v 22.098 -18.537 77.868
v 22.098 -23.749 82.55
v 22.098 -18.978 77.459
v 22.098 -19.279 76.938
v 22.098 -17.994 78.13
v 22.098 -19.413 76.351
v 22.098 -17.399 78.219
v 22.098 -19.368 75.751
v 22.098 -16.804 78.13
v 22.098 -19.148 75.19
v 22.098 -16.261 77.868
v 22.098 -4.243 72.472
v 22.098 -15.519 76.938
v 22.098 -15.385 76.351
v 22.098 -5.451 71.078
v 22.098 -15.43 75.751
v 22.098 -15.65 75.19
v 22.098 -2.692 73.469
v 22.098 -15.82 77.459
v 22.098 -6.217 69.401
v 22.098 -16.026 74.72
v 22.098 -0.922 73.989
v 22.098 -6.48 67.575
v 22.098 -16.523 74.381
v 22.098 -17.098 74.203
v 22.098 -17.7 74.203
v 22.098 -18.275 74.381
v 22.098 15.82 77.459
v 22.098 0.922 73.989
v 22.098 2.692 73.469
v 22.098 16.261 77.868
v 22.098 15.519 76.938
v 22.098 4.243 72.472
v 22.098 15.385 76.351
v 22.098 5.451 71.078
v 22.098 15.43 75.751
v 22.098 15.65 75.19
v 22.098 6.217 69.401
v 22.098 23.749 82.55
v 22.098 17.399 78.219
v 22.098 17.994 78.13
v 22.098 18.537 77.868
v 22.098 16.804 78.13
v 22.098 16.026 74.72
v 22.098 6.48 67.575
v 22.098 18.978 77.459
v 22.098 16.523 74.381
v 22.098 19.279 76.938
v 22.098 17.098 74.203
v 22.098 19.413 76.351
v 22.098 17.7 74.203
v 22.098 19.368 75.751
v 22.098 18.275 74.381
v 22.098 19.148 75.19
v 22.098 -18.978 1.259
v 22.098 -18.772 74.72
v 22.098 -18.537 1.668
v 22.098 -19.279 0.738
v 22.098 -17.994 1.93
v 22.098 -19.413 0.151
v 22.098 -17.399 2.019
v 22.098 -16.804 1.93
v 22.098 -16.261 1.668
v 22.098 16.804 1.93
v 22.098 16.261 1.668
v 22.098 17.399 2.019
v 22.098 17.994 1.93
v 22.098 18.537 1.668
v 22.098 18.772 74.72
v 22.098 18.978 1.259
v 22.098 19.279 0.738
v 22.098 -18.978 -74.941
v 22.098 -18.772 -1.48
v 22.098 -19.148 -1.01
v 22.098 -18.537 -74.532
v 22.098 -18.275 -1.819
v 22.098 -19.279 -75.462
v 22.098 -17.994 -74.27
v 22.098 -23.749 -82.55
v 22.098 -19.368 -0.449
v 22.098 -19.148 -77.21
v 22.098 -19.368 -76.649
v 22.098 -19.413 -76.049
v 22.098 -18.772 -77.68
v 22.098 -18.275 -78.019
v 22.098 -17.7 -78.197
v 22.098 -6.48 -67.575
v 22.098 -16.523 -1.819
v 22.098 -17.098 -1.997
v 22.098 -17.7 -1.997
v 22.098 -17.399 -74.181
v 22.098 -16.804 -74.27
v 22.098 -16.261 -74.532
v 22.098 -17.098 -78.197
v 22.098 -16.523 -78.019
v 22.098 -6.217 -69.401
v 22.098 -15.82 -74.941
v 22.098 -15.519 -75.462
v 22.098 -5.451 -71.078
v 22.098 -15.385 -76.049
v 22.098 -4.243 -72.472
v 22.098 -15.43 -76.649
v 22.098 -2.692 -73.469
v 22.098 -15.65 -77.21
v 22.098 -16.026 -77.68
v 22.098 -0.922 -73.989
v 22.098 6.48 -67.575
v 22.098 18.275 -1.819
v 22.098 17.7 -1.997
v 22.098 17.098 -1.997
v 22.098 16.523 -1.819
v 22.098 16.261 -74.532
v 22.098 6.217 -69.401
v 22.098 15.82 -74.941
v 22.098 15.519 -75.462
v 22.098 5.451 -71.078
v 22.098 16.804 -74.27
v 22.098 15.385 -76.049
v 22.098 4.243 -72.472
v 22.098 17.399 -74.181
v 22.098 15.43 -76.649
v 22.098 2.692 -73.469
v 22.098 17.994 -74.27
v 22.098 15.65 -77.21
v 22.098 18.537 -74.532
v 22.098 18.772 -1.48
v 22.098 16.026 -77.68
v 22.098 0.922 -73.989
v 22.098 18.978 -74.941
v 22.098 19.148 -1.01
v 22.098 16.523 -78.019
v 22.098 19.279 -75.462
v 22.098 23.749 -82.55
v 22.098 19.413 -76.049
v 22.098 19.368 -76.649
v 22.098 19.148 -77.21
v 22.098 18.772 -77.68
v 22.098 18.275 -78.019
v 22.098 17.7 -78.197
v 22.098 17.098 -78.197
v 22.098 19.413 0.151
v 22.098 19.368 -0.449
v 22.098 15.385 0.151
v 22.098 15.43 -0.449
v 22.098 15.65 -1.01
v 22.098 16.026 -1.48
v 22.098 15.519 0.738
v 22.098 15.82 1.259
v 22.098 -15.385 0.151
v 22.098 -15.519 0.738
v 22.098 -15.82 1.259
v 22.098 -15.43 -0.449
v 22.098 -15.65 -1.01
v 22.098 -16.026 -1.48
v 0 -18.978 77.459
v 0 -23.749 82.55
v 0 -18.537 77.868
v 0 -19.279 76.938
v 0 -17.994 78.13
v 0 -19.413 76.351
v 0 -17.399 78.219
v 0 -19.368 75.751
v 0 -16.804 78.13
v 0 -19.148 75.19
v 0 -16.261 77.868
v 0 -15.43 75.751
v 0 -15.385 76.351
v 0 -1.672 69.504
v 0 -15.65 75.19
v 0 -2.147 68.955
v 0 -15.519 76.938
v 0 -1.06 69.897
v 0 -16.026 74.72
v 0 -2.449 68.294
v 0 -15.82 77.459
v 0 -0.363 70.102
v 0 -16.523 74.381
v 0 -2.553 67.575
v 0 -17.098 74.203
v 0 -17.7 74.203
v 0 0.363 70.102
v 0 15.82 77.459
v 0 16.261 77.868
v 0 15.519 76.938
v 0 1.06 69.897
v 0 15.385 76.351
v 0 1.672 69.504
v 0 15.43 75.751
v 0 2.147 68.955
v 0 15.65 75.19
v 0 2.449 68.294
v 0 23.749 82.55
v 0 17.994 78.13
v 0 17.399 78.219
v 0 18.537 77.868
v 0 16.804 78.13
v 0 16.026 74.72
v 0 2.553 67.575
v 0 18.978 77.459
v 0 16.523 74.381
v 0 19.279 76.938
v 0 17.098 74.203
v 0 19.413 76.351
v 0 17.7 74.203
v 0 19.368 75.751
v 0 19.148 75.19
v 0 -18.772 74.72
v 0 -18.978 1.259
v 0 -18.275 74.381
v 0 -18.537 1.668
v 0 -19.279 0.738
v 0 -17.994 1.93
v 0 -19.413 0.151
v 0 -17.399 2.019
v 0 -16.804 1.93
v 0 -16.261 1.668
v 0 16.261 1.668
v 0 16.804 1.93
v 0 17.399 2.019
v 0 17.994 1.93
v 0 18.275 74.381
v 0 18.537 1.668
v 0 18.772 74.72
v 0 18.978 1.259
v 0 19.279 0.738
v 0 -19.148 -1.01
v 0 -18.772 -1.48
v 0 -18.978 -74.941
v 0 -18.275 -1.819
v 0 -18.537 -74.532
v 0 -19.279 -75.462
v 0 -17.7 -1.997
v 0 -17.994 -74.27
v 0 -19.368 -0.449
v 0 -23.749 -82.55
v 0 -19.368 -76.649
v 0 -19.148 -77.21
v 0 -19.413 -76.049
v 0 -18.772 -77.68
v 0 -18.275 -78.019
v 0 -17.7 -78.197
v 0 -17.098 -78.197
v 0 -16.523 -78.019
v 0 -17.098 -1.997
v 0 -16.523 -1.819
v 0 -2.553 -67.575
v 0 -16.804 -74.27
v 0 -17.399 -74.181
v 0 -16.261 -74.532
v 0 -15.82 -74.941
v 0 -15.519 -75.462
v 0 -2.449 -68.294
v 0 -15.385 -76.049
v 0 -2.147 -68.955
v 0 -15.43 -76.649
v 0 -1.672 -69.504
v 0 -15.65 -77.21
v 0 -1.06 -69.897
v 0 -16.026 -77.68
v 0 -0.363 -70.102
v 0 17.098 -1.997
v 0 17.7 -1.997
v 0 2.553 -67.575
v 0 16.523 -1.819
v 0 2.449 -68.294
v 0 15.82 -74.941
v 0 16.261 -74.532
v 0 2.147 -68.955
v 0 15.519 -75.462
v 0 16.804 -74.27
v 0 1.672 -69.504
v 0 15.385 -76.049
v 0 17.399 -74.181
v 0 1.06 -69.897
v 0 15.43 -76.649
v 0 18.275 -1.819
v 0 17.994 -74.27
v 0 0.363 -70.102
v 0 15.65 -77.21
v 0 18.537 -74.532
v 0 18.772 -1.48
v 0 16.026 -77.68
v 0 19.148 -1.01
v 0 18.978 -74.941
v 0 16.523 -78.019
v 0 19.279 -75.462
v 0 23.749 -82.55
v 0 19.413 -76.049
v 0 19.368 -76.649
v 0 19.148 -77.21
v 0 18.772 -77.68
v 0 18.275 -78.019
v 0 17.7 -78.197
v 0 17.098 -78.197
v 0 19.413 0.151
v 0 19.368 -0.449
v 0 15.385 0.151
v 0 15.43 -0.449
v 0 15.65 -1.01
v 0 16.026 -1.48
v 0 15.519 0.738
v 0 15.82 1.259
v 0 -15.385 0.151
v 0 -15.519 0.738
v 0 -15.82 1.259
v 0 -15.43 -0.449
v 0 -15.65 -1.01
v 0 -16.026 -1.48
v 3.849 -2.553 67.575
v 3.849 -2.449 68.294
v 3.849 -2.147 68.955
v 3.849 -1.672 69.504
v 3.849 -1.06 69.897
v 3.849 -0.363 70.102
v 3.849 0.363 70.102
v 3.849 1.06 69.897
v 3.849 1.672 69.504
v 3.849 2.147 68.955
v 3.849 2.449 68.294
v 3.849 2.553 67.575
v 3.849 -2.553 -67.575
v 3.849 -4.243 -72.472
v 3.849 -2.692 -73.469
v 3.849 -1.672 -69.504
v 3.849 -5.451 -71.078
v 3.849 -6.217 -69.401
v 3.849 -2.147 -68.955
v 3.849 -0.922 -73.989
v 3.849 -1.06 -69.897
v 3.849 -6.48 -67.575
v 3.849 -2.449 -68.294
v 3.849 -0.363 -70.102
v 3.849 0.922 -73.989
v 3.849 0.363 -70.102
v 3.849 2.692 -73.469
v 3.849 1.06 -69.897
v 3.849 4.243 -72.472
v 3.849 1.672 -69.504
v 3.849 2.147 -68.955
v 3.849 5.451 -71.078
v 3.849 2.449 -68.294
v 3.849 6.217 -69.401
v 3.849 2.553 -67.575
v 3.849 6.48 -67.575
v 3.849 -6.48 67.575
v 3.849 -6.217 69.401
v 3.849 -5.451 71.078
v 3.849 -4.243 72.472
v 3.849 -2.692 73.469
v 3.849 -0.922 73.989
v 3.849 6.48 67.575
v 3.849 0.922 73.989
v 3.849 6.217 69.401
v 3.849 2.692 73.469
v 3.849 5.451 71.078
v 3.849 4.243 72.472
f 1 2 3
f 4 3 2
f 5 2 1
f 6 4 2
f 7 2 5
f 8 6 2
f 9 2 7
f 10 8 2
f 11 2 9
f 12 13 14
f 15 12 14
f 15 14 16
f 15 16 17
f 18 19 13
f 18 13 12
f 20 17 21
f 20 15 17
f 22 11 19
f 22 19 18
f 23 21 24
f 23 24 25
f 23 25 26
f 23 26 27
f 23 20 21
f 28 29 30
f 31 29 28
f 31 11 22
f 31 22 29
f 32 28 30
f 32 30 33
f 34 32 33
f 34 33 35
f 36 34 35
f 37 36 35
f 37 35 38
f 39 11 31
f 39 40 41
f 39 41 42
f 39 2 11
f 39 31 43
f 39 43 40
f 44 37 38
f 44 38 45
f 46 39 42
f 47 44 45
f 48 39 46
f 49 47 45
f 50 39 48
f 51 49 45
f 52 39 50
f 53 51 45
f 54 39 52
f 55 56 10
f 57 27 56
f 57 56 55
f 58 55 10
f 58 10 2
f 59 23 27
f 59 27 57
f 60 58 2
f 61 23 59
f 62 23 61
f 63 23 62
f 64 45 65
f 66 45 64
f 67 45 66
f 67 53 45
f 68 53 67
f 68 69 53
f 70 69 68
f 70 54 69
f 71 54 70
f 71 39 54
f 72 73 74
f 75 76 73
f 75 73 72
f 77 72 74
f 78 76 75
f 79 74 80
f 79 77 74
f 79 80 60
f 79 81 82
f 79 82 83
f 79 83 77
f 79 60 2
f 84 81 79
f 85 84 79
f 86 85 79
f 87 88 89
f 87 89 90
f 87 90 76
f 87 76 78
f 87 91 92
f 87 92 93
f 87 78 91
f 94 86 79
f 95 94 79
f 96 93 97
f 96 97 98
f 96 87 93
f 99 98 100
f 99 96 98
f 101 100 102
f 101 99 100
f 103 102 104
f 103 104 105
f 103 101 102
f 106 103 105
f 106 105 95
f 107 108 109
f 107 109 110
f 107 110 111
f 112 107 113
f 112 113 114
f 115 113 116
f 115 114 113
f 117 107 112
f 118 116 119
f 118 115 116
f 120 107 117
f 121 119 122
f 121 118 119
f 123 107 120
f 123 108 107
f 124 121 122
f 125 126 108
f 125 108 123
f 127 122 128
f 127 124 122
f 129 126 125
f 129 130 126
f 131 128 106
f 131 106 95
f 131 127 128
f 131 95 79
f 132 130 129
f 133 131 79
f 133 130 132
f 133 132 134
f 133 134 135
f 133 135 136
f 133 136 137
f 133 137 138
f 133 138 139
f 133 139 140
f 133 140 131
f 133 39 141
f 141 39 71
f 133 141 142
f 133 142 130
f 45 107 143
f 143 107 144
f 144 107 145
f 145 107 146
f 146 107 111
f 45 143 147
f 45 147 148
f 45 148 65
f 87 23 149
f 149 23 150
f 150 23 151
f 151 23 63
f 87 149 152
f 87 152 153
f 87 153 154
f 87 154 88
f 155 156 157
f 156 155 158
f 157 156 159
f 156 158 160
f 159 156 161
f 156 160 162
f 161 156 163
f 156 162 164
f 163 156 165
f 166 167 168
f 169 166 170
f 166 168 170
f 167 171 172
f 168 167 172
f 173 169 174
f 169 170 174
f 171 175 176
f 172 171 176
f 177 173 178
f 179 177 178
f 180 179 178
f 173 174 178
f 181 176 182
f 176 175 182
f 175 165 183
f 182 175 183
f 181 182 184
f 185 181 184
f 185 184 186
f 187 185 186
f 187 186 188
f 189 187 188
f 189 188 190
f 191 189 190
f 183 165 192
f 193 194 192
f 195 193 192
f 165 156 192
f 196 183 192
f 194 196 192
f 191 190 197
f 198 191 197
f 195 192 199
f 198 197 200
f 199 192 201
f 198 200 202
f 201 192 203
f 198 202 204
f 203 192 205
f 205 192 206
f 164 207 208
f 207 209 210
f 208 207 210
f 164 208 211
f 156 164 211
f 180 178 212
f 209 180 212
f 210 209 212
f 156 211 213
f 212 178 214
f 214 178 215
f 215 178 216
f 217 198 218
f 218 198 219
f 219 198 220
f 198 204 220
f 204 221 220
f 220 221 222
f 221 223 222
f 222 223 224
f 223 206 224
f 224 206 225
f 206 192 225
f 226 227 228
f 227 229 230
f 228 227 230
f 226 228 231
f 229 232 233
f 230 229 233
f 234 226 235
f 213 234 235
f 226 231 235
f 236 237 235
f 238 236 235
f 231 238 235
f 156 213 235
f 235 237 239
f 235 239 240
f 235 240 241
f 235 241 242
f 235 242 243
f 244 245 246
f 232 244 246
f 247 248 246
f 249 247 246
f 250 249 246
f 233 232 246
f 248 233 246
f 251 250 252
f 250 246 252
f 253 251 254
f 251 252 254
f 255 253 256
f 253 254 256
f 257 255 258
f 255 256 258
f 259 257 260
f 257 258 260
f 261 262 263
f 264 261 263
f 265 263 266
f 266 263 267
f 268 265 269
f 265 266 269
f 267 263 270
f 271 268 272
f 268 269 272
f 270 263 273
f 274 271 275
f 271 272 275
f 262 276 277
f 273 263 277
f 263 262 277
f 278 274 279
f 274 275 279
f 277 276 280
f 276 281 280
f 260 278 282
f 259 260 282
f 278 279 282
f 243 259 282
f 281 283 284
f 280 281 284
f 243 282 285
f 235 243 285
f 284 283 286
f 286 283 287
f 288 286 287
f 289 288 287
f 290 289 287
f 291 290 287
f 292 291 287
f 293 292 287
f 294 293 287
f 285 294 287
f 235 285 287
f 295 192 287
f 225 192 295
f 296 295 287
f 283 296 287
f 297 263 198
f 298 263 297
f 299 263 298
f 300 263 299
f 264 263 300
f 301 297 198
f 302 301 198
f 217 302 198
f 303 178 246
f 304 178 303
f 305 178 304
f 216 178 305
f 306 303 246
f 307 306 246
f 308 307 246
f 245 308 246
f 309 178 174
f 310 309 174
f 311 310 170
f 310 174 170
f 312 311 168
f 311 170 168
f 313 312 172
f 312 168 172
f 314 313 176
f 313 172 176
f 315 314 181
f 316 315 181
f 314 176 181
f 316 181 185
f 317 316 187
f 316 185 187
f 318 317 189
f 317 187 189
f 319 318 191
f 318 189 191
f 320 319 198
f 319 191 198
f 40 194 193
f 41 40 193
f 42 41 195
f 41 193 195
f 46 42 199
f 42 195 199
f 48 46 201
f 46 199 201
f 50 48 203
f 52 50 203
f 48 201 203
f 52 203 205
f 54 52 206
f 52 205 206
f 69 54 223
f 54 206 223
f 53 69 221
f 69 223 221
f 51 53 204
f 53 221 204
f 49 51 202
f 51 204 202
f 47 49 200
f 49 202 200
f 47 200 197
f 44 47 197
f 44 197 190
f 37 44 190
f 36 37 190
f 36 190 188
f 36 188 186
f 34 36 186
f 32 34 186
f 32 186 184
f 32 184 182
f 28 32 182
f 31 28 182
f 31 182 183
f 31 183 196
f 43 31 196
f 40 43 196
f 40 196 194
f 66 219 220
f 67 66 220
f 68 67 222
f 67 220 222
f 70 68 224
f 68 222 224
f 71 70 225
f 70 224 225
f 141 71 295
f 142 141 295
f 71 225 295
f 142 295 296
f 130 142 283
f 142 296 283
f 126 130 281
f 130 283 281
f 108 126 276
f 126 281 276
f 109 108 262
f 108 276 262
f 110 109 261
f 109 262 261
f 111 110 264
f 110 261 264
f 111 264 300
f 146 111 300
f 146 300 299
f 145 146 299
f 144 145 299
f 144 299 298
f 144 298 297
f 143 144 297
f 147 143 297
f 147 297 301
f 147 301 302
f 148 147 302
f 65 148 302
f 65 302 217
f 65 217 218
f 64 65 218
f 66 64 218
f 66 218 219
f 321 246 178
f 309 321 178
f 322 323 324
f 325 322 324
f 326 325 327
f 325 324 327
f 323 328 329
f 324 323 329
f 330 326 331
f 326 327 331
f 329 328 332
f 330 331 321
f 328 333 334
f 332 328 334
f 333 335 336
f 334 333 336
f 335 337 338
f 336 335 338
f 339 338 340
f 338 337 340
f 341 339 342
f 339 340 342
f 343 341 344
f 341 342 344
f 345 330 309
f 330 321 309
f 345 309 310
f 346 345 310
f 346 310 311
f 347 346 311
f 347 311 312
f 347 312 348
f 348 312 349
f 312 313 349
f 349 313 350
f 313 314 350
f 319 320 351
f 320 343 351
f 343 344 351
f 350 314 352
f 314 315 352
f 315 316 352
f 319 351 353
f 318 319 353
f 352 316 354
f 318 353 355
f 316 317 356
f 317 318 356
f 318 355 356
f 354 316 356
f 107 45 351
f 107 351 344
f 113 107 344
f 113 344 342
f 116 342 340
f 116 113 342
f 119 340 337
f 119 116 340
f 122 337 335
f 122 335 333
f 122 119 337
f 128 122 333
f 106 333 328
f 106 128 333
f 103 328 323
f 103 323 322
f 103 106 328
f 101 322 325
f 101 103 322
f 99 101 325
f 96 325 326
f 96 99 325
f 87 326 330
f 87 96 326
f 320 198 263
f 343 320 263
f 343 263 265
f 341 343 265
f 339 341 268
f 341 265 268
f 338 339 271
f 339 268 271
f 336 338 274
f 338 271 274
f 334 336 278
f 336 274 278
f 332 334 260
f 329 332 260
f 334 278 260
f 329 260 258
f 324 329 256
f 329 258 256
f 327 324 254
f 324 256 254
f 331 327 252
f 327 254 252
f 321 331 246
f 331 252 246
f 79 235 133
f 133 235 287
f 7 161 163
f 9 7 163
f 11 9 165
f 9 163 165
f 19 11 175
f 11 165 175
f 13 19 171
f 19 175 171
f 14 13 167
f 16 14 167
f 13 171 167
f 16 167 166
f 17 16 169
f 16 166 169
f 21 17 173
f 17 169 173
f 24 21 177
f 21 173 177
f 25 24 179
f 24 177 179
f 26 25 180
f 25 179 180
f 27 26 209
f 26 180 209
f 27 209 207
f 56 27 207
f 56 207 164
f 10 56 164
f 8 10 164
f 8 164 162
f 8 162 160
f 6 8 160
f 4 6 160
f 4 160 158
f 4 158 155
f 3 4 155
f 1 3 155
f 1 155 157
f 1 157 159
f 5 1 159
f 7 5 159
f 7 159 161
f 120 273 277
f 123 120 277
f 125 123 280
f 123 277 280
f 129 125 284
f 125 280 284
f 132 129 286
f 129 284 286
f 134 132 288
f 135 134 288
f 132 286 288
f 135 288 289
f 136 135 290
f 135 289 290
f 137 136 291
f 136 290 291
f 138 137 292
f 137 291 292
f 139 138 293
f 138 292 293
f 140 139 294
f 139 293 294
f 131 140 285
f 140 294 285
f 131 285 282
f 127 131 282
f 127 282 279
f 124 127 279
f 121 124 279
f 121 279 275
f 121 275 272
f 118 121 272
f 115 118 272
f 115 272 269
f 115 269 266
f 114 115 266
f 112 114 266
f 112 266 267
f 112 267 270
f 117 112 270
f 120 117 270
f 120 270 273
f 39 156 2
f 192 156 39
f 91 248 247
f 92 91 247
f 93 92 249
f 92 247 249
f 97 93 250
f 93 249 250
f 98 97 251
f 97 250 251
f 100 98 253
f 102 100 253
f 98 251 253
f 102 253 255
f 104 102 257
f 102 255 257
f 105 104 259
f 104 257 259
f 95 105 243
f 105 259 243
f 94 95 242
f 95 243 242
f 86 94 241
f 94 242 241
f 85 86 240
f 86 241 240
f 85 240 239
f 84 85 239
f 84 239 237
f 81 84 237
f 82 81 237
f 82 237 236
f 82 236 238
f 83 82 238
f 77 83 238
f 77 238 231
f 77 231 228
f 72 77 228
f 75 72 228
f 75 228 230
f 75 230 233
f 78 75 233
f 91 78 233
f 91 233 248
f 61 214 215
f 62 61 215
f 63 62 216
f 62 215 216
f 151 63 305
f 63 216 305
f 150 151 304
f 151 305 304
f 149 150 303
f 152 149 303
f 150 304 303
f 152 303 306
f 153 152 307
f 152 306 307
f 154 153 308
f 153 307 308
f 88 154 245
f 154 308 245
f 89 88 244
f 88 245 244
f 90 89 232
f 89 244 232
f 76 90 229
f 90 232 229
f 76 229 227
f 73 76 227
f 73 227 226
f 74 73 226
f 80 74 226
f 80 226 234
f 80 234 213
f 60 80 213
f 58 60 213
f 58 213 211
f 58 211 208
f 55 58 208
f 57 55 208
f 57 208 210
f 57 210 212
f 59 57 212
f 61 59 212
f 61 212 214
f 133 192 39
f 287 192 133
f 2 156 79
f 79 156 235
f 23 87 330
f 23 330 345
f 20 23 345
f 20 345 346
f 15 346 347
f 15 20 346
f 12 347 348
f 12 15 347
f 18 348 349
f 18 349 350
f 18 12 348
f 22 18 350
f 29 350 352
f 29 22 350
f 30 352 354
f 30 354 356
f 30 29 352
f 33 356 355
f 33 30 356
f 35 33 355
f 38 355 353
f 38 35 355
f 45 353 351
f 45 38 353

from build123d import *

# Parameters (mm, degrees)
SKETCH1_W              = 165.1
SKETCH1_H              = 47.498
BOSS_EXTRUDE1_DEPTH    = 22.098
CUT_EXTRUDE1_DEPTH     = 18.249011
F_10_32_TAPPED_HOLE1_D = 4.0386


with BuildPart() as part:
    # Sketch1 → Boss-Extrude1 (new body)
    with BuildSketch(Plane(origin=(0, 0, 0), x_dir=(0, 0, -1), z_dir=(1, 0, 0))):
        Rectangle(SKETCH1_W, SKETCH1_H)
        with BuildLine():
            Line((-67.5752522, 2.5527), (67.5752522, 2.5527))
            ThreePointArc((67.5752522, 2.5527), (70.1279522, 0), (67.5752522, -2.5527))
            Line((67.5752522, -2.5527), (-67.5752522, -2.5527))
            ThreePointArc((-67.5752522, -2.5527), (-70.1279522, 0), (-67.5752522, 2.5527))
        make_face(mode=Mode.SUBTRACT)
    extrude(amount=BOSS_EXTRUDE1_DEPTH)

    # Sketch2 → Cut-Extrude1 (cut)
    with BuildSketch(Plane(origin=(22.098, 0, 0), x_dir=(0, 0, -1), z_dir=(1, 0, 0))):
        with BuildLine():
            Line((-67.5752522, 6.4797559), (67.5752522, 6.4797559))
            ThreePointArc((67.5752522, 6.4797559), (74.0550081, 0), (67.5752522, -6.4797559))
            Line((67.5752522, -6.4797559), (-67.5752522, -6.4797559))
            ThreePointArc((-67.5752522, -6.4797559), (-74.0550081, 0), (-67.5752522, 6.4797559))
        make_face()
    extrude(amount=-CUT_EXTRUDE1_DEPTH, mode=Mode.SUBTRACT)

    # #10-32 Tapped Hole1 (through all)
    with Locations(Plane(origin=(22.098, 0, 0), x_dir=(0, 0, -1), z_dir=(1, 0, 0))):
        with Locations((-76.2, 17.399), (-76.2, -17.399), (0, -17.399), (76.2, -17.399), (76.2, 17.399), (0, 17.399)):
            Hole(F_10_32_TAPPED_HOLE1_D / 2)


solid = part.part
